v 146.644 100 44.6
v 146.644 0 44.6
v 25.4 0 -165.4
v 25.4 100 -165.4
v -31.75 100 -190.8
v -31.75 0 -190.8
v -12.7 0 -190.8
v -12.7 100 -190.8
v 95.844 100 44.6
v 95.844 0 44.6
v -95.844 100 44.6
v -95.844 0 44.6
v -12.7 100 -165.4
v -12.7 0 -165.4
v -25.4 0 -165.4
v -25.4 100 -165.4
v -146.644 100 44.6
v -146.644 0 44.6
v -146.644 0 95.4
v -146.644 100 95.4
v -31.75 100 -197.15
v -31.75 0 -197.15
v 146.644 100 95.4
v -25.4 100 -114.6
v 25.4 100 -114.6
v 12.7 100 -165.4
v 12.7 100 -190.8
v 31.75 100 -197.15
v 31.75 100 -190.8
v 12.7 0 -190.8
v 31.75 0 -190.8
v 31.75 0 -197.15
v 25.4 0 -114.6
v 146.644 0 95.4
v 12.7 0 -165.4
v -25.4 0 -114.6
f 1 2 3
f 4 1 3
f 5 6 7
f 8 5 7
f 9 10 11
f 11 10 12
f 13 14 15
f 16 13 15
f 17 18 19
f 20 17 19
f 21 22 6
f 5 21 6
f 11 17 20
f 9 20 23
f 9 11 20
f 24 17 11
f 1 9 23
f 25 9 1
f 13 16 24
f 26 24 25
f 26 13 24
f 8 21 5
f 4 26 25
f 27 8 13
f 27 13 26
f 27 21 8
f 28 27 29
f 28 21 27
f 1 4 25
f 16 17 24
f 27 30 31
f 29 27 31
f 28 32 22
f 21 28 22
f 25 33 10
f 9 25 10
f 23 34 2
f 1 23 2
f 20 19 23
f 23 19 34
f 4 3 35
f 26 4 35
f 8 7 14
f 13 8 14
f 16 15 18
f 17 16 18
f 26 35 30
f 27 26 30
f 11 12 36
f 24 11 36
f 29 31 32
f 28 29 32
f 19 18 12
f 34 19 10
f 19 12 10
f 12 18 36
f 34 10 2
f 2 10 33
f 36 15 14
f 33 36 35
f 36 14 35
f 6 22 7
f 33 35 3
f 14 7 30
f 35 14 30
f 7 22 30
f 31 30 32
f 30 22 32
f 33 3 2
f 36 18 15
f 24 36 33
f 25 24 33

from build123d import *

# Parameters (mm, degrees)
BOSS_EXTRUDE1_DEPTH = 100


with BuildPart() as part:
    # Sketch1 → Boss-Extrude1 (new body)
    with BuildSketch(Plane(origin=(0, 0, 0), x_dir=(1, 0, 0), z_dir=(0, 1, 0))):
        Polygon((-146.64355653, -95.4), (146.64355653, -95.4), (146.64355653, -44.6), (25.4, 165.4), (12.7, 165.4), (12.7, 190.8), (31.75, 190.8), (31.75, 197.15), (-31.75, 197.15), (-31.75, 190.8), (-12.7, 190.8), (-12.7, 165.4), (-25.4, 165.4), (-146.64355653, -44.6), align=None)
        Polygon((25.4, 114.6), (95.84355653, -44.6), (-95.84355653, -44.6), (-25.4, 114.6), align=None, mode=Mode.SUBTRACT)
    extrude(amount=BOSS_EXTRUDE1_DEPTH)


solid = part.part
